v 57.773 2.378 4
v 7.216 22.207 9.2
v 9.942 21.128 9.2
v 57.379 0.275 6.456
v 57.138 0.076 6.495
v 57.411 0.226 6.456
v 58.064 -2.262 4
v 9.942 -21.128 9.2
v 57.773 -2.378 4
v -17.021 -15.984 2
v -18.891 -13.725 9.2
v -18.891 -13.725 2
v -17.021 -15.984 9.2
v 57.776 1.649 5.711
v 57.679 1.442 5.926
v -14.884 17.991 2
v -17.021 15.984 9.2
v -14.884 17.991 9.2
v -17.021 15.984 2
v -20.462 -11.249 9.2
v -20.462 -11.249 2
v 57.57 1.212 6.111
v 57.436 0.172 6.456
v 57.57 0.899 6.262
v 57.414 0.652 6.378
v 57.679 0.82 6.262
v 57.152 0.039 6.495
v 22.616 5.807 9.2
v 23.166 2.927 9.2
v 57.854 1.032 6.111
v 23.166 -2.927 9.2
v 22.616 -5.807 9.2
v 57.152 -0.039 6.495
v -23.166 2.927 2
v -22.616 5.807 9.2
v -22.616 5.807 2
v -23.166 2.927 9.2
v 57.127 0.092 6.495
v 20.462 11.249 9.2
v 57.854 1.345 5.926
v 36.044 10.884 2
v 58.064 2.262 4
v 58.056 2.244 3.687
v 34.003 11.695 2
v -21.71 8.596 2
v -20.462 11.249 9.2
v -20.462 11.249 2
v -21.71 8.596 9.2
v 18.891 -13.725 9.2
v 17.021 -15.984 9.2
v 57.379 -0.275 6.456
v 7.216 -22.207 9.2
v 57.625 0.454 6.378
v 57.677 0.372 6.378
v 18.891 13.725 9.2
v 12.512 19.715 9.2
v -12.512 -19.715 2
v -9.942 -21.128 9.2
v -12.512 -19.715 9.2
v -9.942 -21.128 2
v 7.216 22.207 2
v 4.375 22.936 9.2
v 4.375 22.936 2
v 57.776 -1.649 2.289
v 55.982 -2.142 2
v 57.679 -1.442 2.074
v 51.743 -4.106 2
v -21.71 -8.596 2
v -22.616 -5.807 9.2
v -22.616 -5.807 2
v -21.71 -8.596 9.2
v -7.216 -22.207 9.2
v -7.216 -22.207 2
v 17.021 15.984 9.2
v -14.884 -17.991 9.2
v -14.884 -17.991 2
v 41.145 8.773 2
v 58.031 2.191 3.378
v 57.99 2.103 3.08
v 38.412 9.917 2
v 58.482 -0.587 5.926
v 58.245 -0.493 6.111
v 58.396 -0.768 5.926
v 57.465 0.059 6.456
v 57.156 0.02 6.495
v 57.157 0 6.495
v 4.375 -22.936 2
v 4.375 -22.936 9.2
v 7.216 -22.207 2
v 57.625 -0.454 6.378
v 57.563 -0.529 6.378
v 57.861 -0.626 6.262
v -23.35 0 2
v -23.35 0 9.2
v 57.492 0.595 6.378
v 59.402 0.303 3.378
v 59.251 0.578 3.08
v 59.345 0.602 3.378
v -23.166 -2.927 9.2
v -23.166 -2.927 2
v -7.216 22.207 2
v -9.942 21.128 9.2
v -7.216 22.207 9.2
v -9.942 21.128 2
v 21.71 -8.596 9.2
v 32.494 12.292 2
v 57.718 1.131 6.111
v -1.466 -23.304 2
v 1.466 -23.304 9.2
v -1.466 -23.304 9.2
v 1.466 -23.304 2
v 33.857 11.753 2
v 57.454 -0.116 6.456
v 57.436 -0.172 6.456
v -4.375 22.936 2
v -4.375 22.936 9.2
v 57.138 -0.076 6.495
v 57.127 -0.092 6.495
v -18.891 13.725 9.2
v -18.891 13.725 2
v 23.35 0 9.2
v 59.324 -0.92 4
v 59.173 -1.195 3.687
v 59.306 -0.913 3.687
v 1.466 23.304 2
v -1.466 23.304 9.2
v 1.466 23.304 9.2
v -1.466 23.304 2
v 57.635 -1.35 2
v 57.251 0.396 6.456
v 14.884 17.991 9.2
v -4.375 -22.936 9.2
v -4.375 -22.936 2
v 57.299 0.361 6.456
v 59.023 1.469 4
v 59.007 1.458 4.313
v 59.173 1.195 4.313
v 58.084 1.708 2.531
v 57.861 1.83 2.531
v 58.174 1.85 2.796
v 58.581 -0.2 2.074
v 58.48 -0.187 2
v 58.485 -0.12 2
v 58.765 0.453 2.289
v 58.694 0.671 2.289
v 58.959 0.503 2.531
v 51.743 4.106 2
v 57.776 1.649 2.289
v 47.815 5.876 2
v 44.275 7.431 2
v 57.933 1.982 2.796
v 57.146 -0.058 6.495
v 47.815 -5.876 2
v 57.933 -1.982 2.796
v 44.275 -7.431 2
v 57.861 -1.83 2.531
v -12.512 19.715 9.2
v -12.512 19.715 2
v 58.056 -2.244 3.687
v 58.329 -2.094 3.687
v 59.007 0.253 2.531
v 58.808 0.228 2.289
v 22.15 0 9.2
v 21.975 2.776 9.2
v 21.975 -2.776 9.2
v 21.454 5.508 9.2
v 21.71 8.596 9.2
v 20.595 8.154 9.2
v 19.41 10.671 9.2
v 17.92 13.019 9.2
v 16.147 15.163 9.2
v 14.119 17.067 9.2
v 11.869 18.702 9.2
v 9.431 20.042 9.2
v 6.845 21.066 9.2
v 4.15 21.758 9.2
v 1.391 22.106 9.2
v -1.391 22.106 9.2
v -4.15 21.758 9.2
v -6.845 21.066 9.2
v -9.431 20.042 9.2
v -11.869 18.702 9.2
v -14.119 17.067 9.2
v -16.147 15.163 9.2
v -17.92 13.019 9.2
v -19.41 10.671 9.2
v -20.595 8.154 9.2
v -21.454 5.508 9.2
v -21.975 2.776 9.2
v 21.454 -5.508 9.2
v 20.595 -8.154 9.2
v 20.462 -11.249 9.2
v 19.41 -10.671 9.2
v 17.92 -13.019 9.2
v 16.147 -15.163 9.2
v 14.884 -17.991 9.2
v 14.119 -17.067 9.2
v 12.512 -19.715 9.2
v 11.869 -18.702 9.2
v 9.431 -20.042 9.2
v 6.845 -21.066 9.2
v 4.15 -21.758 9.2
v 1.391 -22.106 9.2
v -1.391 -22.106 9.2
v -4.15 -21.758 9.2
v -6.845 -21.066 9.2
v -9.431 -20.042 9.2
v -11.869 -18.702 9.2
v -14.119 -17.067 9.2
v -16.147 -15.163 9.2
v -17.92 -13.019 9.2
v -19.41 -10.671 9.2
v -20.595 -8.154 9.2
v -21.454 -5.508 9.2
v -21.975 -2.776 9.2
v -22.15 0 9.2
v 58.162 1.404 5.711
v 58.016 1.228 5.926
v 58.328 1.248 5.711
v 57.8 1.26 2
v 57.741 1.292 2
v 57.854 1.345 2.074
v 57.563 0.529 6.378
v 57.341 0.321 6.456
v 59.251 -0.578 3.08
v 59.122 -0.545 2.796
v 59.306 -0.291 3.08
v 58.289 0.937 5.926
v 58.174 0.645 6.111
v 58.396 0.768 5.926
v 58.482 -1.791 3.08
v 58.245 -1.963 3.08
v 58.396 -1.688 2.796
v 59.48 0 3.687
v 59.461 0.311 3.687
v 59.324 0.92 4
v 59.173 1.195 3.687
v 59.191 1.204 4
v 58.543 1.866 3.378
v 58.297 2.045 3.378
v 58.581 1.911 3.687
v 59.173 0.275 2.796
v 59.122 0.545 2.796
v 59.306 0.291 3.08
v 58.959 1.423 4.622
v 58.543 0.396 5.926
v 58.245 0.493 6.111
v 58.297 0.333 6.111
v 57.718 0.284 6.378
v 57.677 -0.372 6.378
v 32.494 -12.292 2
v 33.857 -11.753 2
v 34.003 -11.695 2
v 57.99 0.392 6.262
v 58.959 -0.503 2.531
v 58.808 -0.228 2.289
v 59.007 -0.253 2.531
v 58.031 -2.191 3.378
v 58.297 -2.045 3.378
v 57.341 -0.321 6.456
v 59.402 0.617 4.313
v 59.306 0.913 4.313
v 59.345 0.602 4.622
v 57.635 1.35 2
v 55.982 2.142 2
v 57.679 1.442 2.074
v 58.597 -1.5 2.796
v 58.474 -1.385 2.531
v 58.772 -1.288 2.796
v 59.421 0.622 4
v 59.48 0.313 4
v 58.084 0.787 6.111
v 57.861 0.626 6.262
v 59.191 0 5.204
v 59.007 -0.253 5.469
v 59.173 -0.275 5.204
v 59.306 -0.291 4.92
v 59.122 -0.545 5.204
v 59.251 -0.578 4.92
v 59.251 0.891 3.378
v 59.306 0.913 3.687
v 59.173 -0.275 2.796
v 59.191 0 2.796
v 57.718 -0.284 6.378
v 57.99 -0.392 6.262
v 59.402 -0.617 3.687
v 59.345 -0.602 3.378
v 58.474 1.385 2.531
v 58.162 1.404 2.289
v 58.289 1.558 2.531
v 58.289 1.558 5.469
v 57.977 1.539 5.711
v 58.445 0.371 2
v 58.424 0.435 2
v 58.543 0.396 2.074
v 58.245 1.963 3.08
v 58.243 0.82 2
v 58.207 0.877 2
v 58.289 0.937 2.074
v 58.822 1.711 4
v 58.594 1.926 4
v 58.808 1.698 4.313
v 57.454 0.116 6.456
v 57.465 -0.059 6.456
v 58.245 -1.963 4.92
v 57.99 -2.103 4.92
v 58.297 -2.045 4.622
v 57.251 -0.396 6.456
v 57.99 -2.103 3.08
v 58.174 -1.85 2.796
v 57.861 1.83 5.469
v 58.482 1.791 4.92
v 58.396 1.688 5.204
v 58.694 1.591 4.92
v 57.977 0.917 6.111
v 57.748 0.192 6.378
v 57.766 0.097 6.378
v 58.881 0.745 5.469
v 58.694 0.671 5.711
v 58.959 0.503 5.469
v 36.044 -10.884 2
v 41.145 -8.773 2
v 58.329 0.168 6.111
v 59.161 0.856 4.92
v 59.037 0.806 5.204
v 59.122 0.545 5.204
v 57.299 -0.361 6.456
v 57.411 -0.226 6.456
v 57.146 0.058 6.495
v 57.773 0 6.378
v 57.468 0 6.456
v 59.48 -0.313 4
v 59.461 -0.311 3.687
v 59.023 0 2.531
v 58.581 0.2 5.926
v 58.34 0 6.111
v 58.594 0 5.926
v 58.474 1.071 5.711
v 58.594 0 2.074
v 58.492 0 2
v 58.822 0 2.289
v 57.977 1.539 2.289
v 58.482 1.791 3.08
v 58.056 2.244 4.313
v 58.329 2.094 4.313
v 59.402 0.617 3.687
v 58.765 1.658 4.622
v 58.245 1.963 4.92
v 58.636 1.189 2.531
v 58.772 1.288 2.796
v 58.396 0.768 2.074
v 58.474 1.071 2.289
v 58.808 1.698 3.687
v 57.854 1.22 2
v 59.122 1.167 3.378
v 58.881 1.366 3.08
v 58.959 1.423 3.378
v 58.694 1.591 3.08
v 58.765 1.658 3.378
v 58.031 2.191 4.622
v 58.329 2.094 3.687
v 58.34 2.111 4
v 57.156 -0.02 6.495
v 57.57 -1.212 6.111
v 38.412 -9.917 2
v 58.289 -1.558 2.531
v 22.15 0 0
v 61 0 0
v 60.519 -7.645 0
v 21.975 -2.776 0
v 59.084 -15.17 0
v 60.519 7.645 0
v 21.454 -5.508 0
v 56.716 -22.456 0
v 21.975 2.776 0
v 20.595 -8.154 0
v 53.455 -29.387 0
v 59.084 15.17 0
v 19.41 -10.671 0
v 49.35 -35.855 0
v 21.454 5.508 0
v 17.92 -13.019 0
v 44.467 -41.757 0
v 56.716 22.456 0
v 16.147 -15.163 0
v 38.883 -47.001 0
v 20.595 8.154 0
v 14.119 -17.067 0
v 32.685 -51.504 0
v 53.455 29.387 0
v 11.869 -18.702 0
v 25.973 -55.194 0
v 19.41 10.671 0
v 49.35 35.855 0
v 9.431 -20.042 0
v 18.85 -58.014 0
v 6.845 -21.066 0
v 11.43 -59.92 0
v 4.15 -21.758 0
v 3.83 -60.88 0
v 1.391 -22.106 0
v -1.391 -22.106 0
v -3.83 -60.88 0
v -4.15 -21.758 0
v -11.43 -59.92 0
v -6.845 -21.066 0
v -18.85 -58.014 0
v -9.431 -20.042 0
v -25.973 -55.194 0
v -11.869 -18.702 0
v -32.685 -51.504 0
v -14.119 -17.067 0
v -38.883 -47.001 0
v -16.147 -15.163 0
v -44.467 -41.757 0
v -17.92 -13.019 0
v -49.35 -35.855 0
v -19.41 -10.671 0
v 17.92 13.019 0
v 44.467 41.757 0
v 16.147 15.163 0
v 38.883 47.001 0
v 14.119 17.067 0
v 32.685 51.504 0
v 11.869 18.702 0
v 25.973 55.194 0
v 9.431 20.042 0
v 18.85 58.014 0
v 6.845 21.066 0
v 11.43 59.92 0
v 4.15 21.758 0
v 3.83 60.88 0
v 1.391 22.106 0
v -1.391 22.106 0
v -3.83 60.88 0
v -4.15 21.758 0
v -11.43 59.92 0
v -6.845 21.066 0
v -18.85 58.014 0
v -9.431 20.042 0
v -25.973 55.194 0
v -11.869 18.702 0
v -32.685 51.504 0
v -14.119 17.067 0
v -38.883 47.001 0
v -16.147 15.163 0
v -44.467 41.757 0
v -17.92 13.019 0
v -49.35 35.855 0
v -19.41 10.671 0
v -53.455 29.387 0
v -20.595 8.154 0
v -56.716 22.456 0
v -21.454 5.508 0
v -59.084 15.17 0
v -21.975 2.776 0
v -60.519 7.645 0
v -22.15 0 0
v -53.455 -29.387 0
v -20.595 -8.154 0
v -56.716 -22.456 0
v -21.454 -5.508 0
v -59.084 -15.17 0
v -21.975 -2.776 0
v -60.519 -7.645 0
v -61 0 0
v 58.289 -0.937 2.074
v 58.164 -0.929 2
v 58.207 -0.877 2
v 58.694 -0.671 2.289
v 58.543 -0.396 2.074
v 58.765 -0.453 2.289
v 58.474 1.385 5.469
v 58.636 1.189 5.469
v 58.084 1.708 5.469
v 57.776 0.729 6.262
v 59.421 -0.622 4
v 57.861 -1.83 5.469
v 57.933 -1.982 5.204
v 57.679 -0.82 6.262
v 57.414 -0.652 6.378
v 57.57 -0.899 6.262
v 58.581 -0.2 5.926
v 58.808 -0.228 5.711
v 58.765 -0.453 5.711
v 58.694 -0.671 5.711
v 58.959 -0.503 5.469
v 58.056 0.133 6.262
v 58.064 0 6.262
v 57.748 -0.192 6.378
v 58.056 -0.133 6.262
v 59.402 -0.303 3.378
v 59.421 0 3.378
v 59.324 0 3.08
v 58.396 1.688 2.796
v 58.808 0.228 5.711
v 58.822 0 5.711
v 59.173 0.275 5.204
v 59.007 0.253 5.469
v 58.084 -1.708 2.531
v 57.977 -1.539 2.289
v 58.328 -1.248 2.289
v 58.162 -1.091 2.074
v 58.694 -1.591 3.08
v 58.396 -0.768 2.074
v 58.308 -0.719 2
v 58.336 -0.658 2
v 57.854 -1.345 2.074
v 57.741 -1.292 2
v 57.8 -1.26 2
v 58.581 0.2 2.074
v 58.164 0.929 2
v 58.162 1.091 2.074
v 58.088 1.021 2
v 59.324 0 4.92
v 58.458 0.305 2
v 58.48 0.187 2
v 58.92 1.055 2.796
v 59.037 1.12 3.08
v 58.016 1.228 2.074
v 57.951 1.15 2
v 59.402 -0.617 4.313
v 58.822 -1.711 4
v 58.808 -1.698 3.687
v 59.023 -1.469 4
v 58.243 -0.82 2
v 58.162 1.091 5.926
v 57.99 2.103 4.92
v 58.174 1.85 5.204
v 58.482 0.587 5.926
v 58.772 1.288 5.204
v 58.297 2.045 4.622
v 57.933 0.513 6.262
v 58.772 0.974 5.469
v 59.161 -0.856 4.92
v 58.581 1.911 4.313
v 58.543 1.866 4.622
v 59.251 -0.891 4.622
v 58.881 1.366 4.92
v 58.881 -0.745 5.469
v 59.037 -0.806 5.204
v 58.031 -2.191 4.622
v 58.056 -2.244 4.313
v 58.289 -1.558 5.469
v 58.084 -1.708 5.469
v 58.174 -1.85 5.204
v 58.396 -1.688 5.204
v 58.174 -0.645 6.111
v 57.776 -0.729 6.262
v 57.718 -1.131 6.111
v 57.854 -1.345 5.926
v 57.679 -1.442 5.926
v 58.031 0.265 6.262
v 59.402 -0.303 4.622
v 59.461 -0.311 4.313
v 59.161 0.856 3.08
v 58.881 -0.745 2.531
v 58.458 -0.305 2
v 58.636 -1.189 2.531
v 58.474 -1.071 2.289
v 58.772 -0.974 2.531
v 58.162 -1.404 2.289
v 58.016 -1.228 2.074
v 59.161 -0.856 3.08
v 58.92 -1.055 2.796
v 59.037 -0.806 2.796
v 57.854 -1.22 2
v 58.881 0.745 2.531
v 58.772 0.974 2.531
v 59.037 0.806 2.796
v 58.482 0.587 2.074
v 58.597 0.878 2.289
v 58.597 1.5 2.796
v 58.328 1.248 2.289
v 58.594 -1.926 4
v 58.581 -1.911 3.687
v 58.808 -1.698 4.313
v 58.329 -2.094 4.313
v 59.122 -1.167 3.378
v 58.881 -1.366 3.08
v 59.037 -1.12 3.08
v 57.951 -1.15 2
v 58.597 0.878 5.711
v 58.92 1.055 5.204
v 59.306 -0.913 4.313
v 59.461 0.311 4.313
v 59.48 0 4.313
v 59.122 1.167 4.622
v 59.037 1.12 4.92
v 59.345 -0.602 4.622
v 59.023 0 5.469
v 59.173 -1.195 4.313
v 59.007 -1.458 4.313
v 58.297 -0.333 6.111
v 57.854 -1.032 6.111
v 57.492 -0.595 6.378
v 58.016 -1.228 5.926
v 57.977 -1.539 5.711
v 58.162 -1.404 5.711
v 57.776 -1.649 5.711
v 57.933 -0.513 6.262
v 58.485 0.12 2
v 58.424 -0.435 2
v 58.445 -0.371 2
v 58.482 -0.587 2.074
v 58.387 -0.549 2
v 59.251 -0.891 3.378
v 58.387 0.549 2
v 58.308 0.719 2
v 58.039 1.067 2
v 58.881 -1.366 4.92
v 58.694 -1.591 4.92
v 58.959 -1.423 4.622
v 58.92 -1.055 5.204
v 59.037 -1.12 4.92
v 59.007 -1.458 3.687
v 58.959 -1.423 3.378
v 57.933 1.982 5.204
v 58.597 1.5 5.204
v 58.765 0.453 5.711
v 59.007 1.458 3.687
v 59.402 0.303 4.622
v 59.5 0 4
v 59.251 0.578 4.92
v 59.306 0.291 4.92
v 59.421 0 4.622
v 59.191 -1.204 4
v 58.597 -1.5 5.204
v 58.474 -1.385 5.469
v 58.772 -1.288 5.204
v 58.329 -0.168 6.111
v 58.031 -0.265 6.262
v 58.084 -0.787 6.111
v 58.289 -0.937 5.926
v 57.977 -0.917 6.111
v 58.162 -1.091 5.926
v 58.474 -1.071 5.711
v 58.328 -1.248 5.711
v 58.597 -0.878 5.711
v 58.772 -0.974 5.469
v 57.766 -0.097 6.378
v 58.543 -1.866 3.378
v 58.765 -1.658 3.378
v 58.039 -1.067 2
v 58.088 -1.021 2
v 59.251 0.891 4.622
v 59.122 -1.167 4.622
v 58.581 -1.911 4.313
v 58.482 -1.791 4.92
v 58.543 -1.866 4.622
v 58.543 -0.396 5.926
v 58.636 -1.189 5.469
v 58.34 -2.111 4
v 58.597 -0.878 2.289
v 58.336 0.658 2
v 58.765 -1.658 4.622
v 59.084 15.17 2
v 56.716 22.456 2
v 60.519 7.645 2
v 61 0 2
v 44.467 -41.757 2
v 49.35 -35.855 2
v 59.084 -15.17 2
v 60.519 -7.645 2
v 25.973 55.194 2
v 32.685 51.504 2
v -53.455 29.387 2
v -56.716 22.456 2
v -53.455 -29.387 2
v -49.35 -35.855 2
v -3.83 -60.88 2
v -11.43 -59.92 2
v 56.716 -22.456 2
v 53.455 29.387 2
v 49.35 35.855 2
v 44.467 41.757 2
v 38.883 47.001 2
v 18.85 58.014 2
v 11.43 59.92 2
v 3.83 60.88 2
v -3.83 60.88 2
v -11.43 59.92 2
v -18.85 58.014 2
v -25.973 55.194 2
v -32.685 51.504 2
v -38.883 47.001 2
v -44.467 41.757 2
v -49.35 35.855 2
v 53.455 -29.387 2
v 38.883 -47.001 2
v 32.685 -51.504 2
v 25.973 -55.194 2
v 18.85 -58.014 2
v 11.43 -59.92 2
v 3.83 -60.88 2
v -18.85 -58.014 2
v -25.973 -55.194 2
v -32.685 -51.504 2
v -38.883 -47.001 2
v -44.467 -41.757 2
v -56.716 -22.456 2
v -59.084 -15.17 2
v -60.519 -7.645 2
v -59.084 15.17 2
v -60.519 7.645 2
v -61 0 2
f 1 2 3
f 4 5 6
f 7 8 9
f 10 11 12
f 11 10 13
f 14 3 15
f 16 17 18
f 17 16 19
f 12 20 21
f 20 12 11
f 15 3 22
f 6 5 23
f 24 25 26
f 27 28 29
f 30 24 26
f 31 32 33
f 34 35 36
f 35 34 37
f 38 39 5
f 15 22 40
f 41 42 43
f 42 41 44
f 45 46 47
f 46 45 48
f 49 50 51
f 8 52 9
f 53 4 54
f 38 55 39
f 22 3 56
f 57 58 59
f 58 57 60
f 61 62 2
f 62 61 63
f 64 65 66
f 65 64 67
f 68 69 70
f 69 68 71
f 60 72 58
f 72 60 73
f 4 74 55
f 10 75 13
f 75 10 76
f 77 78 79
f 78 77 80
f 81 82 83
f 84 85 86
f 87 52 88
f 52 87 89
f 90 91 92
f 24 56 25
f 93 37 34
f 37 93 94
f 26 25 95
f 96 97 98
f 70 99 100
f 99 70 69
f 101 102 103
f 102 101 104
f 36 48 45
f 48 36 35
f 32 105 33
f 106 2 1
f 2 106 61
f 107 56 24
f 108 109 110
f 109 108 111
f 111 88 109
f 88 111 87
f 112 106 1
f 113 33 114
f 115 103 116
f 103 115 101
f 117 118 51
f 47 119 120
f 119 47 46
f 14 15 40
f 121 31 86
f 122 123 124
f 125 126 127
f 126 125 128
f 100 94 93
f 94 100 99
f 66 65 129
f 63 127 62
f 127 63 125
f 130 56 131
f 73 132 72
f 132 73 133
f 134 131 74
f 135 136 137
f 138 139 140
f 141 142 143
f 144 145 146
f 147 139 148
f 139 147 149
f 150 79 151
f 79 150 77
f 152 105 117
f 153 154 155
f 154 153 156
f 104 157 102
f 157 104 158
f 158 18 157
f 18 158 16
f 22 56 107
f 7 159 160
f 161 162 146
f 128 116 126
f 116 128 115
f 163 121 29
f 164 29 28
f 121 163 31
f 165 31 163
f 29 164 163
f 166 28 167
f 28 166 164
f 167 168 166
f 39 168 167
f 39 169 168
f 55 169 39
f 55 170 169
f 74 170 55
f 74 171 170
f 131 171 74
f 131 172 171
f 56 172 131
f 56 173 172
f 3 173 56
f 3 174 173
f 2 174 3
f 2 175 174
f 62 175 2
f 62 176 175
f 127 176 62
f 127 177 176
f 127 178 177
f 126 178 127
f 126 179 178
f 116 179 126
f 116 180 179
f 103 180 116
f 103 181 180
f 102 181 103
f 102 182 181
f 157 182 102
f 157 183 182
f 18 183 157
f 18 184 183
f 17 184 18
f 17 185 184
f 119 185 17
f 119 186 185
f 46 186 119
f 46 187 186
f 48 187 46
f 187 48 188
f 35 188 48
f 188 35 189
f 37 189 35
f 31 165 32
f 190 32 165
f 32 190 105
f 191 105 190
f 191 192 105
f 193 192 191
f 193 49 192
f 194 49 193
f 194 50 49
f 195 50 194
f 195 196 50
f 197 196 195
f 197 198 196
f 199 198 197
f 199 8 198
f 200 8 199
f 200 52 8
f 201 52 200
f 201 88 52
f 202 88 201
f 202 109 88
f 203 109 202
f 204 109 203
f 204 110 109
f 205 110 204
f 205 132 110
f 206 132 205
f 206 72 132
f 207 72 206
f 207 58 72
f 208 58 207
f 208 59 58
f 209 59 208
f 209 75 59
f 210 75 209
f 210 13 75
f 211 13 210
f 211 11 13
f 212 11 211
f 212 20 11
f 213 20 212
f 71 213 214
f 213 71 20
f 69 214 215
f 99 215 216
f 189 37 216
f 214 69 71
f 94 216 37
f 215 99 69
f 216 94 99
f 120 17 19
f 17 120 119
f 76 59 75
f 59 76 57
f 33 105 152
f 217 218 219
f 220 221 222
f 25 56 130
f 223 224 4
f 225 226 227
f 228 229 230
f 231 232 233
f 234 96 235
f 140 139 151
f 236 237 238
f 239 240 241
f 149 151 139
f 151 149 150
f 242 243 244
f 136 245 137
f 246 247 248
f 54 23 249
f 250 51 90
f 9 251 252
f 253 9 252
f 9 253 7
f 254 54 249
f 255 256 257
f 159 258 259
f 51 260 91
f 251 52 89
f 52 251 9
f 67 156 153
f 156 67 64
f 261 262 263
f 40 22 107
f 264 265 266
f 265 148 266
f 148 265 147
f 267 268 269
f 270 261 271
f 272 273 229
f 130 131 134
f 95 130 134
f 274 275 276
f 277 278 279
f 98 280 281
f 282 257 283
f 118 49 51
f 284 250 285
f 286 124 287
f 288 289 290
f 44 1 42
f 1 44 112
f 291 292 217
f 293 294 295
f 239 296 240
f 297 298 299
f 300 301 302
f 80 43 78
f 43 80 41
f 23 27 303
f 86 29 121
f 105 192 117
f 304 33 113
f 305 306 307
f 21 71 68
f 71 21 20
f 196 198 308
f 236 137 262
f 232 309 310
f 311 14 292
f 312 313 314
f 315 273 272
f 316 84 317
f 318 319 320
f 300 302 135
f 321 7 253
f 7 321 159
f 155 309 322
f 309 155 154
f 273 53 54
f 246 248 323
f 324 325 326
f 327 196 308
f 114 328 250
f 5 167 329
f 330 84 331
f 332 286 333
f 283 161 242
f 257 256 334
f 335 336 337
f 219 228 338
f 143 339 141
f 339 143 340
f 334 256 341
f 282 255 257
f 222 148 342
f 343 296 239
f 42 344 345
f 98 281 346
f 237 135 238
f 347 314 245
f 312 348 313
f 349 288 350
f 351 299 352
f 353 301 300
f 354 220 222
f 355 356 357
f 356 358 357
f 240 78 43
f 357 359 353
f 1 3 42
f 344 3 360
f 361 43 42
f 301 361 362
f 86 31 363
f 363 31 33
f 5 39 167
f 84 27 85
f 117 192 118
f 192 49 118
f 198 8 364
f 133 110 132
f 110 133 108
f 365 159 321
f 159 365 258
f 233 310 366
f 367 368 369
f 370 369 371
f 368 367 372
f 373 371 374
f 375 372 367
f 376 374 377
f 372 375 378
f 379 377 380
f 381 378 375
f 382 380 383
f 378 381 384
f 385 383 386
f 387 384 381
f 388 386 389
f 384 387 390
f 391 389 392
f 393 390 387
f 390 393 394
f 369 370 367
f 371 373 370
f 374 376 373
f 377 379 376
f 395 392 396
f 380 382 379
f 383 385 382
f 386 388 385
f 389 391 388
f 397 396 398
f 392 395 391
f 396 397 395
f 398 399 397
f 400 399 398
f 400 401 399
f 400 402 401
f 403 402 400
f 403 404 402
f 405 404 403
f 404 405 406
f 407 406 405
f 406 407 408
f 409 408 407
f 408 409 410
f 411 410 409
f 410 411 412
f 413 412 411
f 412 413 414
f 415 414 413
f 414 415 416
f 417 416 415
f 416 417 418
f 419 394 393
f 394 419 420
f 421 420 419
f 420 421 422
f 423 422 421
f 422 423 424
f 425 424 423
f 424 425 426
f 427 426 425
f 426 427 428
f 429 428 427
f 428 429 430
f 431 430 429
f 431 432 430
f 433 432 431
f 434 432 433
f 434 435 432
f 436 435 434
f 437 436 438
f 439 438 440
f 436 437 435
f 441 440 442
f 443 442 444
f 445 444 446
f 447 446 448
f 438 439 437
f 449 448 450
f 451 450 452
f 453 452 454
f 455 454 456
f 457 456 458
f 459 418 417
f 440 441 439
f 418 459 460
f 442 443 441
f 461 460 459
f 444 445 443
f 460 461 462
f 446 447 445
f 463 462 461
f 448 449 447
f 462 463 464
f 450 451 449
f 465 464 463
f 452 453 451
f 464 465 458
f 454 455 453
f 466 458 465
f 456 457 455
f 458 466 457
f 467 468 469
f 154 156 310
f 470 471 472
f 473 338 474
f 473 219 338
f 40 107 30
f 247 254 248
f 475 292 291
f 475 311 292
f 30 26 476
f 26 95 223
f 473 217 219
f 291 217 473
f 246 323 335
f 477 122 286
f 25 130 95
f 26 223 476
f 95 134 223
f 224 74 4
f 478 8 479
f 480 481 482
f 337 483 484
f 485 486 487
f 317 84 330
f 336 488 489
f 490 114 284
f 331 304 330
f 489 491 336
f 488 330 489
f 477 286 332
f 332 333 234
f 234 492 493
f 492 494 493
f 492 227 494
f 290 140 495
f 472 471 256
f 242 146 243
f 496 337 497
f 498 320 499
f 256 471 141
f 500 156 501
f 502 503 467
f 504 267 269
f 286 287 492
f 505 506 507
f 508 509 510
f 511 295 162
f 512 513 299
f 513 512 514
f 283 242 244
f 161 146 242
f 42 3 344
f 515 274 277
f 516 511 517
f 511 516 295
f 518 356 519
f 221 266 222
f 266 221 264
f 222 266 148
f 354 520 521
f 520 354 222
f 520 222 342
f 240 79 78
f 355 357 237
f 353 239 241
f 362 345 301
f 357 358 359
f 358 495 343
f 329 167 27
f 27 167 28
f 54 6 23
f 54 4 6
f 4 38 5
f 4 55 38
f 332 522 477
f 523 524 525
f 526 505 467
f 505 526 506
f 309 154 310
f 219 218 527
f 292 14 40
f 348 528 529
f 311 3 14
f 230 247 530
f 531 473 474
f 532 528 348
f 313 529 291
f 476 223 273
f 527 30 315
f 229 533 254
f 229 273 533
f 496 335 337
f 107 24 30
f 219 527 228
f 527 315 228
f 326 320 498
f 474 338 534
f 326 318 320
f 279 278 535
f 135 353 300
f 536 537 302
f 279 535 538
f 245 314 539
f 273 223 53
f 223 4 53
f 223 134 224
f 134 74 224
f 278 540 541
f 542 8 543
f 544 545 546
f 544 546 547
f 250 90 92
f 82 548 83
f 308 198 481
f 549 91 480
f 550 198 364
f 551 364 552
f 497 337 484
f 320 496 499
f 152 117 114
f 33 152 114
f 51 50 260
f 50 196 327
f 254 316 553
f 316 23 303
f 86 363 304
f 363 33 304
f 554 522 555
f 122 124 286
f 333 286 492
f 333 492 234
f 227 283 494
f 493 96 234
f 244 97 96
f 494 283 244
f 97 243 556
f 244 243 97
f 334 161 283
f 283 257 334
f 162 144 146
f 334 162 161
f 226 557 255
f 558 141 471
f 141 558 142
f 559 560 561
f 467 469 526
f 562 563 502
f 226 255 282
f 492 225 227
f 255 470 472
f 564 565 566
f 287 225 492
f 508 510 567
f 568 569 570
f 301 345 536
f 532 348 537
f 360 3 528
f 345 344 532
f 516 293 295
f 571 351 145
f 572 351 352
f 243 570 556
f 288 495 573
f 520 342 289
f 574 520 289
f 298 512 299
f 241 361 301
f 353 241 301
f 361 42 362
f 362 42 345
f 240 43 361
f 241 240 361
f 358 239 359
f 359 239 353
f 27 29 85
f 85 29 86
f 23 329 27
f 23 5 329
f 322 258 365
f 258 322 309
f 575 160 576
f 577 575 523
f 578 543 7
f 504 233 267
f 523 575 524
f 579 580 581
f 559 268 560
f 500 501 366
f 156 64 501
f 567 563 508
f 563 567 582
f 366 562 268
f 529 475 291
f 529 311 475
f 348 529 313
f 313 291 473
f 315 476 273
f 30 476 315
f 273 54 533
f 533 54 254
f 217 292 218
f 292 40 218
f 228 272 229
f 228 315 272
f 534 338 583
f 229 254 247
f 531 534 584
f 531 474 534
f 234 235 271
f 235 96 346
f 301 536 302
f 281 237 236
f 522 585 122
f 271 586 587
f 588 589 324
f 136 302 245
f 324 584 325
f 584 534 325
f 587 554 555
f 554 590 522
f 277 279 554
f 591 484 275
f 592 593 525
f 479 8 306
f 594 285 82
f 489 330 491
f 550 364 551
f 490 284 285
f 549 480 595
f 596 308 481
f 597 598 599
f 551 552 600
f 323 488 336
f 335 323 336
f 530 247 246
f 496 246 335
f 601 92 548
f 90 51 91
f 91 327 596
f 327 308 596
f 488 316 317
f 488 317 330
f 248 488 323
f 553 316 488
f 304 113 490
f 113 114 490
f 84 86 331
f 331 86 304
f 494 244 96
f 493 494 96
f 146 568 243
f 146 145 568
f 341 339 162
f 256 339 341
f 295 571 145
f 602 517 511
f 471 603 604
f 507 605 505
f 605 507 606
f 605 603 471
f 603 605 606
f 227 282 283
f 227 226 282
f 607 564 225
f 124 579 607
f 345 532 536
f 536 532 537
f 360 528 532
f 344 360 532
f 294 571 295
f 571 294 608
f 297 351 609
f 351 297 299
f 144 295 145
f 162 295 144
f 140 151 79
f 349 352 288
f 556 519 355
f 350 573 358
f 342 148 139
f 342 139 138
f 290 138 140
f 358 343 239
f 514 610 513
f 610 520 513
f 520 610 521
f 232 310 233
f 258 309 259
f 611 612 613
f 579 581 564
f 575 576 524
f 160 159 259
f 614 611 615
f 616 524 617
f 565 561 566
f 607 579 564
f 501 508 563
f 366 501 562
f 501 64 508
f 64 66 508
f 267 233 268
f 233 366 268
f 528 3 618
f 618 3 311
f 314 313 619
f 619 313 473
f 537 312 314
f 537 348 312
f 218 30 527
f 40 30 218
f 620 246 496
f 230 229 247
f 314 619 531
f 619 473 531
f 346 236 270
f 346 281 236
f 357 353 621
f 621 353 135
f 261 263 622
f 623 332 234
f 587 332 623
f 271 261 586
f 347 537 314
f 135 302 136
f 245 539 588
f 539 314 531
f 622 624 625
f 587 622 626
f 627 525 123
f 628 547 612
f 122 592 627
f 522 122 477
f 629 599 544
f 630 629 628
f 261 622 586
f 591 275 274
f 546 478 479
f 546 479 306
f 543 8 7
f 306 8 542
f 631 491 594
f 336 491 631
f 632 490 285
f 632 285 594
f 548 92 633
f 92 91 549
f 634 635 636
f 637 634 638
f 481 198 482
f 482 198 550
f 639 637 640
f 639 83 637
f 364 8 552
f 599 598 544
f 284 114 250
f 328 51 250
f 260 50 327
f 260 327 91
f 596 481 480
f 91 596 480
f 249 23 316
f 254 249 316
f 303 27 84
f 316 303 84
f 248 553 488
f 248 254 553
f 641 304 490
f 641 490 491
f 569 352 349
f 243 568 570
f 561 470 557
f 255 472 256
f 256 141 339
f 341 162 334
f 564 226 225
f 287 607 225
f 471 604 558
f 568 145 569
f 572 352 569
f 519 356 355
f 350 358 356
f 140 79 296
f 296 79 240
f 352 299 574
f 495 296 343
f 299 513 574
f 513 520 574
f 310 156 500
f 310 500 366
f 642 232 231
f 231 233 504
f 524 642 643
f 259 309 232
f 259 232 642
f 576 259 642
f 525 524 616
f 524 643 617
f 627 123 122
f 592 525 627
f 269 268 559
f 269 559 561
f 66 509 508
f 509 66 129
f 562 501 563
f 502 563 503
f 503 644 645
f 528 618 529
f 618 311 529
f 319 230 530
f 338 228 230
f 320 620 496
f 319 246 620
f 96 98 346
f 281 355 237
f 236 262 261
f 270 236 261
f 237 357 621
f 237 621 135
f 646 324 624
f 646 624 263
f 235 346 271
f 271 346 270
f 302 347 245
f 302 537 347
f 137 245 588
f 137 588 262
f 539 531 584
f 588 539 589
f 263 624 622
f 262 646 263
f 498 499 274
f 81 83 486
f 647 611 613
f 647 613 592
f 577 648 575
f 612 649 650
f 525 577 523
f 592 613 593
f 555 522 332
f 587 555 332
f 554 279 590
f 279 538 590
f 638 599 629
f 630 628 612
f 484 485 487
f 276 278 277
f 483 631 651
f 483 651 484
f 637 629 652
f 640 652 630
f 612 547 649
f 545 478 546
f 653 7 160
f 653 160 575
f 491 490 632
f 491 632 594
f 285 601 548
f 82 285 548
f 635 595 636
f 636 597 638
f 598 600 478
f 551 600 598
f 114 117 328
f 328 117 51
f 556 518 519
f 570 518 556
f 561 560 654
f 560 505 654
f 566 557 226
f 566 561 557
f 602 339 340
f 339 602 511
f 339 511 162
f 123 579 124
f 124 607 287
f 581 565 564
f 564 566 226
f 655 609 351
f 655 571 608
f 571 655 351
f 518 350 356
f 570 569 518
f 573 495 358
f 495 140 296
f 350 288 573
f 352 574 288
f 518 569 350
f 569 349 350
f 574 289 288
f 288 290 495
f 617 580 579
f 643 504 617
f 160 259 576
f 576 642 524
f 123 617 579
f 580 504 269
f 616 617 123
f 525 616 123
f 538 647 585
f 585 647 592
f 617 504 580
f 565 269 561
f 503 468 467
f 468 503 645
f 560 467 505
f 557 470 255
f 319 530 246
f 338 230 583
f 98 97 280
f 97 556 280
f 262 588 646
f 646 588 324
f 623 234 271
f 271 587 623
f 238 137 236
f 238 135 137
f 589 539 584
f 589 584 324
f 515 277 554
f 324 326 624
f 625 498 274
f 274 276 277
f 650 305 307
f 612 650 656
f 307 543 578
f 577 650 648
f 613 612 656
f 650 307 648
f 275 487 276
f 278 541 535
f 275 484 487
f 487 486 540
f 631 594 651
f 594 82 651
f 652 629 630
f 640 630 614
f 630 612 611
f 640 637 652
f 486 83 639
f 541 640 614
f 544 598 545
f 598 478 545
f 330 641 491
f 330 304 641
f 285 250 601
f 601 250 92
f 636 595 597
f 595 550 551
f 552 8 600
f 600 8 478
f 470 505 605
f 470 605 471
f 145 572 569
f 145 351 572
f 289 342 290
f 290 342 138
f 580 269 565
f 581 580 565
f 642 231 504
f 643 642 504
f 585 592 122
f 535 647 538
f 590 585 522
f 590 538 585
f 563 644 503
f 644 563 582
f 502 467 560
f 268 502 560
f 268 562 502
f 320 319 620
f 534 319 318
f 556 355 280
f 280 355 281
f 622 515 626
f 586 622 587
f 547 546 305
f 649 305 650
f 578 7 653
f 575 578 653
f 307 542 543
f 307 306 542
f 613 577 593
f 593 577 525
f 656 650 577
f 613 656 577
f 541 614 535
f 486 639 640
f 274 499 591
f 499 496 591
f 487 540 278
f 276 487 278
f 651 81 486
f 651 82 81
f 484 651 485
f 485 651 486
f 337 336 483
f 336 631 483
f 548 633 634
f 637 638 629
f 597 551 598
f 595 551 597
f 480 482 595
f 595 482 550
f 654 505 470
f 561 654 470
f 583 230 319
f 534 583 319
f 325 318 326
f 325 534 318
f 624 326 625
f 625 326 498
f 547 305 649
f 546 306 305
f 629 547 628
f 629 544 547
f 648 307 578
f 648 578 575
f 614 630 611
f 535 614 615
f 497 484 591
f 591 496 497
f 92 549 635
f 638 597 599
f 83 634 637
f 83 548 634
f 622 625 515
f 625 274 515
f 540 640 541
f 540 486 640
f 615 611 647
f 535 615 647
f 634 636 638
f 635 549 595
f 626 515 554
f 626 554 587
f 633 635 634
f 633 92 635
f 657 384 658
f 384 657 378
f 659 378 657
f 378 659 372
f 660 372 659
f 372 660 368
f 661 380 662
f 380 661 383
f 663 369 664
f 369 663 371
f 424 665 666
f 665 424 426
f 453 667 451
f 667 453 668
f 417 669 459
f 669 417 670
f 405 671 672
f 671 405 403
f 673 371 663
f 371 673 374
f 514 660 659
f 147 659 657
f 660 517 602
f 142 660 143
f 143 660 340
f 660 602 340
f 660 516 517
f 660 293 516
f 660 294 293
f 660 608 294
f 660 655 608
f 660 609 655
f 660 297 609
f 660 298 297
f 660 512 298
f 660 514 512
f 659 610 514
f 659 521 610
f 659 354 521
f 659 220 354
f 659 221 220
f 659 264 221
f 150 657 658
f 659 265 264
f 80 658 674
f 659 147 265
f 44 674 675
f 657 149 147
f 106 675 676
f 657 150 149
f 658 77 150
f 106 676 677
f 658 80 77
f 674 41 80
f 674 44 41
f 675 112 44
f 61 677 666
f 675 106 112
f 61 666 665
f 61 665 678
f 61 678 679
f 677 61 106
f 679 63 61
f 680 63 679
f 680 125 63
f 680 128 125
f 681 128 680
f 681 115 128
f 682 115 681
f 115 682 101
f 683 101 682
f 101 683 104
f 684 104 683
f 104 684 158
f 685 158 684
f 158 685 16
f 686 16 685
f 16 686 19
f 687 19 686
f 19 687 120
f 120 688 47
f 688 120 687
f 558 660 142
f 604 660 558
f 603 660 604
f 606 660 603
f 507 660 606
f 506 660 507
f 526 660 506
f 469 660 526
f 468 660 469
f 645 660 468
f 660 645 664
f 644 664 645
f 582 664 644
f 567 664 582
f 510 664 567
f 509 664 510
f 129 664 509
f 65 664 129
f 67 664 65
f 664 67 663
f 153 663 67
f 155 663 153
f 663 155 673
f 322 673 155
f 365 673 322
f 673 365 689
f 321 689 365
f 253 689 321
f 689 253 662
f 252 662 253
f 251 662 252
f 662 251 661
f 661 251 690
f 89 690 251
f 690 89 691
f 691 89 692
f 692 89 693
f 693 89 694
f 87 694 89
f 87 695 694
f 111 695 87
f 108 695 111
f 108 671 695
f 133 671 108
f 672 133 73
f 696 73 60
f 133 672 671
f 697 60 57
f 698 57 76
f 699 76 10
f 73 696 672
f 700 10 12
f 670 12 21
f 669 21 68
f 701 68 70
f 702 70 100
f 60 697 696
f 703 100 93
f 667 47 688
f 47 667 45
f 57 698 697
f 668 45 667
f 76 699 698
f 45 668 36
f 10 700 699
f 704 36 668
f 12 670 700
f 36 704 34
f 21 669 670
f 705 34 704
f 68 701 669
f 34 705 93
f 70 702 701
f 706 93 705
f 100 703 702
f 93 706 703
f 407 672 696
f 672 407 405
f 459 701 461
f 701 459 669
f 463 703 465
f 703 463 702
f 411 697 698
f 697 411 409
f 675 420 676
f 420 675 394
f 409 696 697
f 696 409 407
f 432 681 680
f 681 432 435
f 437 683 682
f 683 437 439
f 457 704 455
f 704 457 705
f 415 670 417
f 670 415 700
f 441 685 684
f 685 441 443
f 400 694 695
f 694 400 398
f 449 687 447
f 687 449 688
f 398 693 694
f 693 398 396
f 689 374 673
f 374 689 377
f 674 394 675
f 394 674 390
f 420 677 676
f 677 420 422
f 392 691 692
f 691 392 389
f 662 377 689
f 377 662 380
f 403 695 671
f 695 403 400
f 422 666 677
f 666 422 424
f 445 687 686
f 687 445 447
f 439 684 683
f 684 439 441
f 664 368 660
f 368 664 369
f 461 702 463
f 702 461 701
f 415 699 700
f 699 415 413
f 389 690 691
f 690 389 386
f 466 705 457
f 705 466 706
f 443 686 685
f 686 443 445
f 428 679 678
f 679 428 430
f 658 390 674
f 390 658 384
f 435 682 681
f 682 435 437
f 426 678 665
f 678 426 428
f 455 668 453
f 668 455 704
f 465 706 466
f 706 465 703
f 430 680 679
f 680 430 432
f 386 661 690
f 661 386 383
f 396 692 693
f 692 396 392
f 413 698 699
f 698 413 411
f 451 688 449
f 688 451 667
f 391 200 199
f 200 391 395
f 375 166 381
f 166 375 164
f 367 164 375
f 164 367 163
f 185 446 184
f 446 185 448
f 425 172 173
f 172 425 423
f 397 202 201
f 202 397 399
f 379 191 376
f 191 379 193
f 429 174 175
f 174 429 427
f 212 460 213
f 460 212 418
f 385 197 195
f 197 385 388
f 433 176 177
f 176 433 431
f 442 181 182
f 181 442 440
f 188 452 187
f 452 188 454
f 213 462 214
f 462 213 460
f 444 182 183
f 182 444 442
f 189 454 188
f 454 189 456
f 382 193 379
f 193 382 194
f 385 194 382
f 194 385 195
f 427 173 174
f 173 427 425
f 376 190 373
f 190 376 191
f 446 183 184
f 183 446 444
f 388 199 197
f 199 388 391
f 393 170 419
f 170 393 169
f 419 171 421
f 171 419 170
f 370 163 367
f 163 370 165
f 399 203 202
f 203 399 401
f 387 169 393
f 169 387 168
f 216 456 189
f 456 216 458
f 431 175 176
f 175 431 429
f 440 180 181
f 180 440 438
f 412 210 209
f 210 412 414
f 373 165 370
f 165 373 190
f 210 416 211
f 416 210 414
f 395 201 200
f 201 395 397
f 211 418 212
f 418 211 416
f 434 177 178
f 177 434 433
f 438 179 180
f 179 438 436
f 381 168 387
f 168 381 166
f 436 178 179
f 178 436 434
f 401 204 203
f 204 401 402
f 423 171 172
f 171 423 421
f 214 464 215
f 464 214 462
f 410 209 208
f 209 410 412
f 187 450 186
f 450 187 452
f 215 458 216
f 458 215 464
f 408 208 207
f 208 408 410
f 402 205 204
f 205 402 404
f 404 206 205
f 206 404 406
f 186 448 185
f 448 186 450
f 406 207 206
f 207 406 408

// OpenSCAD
$fn=50;

difference()
{
	union()
	{
		hull()
		{
			cylinder(h=9.2, d=44 + 0.3 + 1.2 * 2);
			translate([57,0,8/2]) sphere(d=5);
		}
		cylinder(h=2, d=122);
	}
	translate([0,0,-0.1]) cylinder(h=9.2 + 0.2, d=44 + 0.3);
}
